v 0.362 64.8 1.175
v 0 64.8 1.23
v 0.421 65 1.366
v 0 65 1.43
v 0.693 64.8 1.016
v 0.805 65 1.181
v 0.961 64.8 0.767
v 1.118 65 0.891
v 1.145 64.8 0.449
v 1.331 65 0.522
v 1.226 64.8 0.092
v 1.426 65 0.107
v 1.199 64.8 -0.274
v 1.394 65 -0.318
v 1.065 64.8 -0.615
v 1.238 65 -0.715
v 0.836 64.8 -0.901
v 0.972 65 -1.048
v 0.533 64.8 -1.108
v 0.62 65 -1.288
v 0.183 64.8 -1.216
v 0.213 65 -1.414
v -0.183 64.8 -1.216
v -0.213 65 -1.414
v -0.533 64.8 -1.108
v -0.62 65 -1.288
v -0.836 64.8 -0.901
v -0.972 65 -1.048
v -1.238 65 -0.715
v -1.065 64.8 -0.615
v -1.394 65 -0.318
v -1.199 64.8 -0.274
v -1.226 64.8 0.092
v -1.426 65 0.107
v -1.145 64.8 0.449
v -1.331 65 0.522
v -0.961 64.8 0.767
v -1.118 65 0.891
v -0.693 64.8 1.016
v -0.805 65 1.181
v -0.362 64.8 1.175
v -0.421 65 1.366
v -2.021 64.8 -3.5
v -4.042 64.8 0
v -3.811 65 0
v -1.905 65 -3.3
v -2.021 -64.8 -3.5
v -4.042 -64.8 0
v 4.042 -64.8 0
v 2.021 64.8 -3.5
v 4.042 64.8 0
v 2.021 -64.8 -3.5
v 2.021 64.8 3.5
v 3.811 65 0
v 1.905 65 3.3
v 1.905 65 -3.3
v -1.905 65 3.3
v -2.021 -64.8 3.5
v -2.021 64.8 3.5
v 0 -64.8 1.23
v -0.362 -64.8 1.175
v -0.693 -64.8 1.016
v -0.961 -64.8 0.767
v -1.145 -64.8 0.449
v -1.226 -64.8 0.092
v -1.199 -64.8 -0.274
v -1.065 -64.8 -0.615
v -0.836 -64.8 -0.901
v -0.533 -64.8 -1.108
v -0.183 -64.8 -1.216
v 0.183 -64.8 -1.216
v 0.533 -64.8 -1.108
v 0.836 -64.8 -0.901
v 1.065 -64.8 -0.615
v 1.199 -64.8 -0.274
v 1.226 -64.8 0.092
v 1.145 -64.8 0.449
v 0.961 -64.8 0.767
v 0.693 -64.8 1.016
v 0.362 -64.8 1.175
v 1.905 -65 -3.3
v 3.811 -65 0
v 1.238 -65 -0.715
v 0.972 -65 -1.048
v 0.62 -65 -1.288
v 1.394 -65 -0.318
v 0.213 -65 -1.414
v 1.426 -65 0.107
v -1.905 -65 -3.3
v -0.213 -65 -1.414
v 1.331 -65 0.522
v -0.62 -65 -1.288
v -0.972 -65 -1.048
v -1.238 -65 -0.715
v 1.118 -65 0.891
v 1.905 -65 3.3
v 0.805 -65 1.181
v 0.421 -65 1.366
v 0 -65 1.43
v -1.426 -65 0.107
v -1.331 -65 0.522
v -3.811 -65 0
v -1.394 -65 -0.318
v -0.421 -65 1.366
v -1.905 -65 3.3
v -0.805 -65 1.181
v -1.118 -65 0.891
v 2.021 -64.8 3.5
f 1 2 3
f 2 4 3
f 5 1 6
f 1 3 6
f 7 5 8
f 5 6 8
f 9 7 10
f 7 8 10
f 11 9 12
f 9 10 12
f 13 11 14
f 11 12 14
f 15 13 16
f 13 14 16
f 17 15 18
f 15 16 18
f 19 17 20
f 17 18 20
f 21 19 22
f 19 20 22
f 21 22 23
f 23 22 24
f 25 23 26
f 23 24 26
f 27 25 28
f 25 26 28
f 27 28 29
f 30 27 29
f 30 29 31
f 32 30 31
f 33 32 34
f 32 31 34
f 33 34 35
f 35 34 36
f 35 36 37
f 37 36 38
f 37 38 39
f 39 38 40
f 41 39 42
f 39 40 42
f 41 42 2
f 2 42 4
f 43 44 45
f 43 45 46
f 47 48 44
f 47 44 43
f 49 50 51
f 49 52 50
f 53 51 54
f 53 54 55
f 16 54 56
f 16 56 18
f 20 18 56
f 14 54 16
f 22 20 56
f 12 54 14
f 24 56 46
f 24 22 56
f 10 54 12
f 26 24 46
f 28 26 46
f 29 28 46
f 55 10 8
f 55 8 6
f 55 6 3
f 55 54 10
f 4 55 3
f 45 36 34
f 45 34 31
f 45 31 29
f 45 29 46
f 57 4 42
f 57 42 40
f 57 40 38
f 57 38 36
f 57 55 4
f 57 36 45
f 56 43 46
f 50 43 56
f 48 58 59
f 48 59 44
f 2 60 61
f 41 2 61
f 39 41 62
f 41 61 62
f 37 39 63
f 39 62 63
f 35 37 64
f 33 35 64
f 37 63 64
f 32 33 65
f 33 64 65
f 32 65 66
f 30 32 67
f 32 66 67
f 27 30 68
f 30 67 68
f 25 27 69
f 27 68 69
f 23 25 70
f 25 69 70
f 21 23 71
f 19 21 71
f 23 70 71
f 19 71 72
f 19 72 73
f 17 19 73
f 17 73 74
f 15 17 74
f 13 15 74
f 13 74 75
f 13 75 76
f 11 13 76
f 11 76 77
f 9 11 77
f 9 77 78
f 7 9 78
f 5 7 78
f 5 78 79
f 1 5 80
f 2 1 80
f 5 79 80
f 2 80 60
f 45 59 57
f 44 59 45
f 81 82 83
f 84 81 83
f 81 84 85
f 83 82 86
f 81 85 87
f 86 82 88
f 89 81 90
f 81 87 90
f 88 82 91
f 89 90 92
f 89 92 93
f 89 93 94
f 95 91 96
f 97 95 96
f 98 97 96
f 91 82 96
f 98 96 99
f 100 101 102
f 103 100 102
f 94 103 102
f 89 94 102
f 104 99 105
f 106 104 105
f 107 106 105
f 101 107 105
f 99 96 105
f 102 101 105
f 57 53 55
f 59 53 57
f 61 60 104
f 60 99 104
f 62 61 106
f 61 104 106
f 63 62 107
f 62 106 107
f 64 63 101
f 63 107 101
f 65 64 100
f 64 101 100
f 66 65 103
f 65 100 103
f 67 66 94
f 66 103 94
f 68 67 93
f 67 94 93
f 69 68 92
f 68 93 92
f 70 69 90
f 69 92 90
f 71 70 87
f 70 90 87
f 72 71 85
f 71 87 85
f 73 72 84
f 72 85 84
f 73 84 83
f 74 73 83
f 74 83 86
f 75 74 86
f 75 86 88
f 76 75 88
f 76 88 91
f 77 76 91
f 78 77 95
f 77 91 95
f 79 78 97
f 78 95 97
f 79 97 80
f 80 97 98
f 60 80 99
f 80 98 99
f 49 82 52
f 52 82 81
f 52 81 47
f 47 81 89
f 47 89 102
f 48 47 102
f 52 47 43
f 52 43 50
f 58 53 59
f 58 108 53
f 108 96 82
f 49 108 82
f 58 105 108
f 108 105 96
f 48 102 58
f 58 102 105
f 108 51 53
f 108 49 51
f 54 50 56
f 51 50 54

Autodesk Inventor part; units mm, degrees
ref_plane "YZ Plane" through (0, 0, 0) normal (1, 0, 0) x (0, 1, 0)
ref_plane "XZ Plane" through (0, 0, 0) normal (0, 1, 0) x (-1, 0, 0)
ref_plane "XY Plane" through (0, 0, 0) normal (0, 0, 1) x (1, 0, 0)
sketch "スケッチ1" plane through (0, 0, 0) normal (0, 1, 0) x (-1, 0, 0)
  line L0 (2.0207, 3.5) -> (4.0415, 0)
  line L1 (4.0415, 0) -> (2.0207, -3.5)
  line L2 (2.0207, -3.5) -> (-2.0207, -3.5)
  line L3 (-2.0207, -3.5) -> (-4.0415, 0)
  line L4 (-4.0415, 0) -> (-2.0207, 3.5)
  line L5 (-2.0207, 3.5) -> (2.0207, 3.5)
  point P0 (0, 0)
  point P1 (0, 0)
  dimension "d0" = 7
extrude "押し出し1" add sketch "スケッチ1" along normal mid plane 130
sketch "スケッチ2" plane through (0, 65, 0) normal (0, 1, 0) x (1, 0, 0)
  point P0 (0, 0)
  point P1 (0, 0)
hole "穴1" at (0, 65, 0) direction (0, -1, 0) diameter 2.459 end through all thread size "M3x0.5" class "6H" standard "ISO Metric profile"
chamfer "面取り1" distance 0.2 angle 45 2 edges at (0, 65, -1.2295) (0, -65, -1.2295)
chamfer "面取り2" distance 0.2 angle 45 12 edges at (0, 65, 3.5) (-3.0311, 65, 1.75) (-3.0311, 65, -1.75) (0, 65, -3.5) (3.0311, 65, -1.75) (3.0311, 65, 1.75) (3.0311, -65, 1.75) (3.0311, -65, -1.75) (0, -65, 3.5) (-3.0311, -65, 1.75) (-3.0311, -65, -1.75) (0, -65, -3.5)
properties part number "Spacer_M3-Hex7-L130"
